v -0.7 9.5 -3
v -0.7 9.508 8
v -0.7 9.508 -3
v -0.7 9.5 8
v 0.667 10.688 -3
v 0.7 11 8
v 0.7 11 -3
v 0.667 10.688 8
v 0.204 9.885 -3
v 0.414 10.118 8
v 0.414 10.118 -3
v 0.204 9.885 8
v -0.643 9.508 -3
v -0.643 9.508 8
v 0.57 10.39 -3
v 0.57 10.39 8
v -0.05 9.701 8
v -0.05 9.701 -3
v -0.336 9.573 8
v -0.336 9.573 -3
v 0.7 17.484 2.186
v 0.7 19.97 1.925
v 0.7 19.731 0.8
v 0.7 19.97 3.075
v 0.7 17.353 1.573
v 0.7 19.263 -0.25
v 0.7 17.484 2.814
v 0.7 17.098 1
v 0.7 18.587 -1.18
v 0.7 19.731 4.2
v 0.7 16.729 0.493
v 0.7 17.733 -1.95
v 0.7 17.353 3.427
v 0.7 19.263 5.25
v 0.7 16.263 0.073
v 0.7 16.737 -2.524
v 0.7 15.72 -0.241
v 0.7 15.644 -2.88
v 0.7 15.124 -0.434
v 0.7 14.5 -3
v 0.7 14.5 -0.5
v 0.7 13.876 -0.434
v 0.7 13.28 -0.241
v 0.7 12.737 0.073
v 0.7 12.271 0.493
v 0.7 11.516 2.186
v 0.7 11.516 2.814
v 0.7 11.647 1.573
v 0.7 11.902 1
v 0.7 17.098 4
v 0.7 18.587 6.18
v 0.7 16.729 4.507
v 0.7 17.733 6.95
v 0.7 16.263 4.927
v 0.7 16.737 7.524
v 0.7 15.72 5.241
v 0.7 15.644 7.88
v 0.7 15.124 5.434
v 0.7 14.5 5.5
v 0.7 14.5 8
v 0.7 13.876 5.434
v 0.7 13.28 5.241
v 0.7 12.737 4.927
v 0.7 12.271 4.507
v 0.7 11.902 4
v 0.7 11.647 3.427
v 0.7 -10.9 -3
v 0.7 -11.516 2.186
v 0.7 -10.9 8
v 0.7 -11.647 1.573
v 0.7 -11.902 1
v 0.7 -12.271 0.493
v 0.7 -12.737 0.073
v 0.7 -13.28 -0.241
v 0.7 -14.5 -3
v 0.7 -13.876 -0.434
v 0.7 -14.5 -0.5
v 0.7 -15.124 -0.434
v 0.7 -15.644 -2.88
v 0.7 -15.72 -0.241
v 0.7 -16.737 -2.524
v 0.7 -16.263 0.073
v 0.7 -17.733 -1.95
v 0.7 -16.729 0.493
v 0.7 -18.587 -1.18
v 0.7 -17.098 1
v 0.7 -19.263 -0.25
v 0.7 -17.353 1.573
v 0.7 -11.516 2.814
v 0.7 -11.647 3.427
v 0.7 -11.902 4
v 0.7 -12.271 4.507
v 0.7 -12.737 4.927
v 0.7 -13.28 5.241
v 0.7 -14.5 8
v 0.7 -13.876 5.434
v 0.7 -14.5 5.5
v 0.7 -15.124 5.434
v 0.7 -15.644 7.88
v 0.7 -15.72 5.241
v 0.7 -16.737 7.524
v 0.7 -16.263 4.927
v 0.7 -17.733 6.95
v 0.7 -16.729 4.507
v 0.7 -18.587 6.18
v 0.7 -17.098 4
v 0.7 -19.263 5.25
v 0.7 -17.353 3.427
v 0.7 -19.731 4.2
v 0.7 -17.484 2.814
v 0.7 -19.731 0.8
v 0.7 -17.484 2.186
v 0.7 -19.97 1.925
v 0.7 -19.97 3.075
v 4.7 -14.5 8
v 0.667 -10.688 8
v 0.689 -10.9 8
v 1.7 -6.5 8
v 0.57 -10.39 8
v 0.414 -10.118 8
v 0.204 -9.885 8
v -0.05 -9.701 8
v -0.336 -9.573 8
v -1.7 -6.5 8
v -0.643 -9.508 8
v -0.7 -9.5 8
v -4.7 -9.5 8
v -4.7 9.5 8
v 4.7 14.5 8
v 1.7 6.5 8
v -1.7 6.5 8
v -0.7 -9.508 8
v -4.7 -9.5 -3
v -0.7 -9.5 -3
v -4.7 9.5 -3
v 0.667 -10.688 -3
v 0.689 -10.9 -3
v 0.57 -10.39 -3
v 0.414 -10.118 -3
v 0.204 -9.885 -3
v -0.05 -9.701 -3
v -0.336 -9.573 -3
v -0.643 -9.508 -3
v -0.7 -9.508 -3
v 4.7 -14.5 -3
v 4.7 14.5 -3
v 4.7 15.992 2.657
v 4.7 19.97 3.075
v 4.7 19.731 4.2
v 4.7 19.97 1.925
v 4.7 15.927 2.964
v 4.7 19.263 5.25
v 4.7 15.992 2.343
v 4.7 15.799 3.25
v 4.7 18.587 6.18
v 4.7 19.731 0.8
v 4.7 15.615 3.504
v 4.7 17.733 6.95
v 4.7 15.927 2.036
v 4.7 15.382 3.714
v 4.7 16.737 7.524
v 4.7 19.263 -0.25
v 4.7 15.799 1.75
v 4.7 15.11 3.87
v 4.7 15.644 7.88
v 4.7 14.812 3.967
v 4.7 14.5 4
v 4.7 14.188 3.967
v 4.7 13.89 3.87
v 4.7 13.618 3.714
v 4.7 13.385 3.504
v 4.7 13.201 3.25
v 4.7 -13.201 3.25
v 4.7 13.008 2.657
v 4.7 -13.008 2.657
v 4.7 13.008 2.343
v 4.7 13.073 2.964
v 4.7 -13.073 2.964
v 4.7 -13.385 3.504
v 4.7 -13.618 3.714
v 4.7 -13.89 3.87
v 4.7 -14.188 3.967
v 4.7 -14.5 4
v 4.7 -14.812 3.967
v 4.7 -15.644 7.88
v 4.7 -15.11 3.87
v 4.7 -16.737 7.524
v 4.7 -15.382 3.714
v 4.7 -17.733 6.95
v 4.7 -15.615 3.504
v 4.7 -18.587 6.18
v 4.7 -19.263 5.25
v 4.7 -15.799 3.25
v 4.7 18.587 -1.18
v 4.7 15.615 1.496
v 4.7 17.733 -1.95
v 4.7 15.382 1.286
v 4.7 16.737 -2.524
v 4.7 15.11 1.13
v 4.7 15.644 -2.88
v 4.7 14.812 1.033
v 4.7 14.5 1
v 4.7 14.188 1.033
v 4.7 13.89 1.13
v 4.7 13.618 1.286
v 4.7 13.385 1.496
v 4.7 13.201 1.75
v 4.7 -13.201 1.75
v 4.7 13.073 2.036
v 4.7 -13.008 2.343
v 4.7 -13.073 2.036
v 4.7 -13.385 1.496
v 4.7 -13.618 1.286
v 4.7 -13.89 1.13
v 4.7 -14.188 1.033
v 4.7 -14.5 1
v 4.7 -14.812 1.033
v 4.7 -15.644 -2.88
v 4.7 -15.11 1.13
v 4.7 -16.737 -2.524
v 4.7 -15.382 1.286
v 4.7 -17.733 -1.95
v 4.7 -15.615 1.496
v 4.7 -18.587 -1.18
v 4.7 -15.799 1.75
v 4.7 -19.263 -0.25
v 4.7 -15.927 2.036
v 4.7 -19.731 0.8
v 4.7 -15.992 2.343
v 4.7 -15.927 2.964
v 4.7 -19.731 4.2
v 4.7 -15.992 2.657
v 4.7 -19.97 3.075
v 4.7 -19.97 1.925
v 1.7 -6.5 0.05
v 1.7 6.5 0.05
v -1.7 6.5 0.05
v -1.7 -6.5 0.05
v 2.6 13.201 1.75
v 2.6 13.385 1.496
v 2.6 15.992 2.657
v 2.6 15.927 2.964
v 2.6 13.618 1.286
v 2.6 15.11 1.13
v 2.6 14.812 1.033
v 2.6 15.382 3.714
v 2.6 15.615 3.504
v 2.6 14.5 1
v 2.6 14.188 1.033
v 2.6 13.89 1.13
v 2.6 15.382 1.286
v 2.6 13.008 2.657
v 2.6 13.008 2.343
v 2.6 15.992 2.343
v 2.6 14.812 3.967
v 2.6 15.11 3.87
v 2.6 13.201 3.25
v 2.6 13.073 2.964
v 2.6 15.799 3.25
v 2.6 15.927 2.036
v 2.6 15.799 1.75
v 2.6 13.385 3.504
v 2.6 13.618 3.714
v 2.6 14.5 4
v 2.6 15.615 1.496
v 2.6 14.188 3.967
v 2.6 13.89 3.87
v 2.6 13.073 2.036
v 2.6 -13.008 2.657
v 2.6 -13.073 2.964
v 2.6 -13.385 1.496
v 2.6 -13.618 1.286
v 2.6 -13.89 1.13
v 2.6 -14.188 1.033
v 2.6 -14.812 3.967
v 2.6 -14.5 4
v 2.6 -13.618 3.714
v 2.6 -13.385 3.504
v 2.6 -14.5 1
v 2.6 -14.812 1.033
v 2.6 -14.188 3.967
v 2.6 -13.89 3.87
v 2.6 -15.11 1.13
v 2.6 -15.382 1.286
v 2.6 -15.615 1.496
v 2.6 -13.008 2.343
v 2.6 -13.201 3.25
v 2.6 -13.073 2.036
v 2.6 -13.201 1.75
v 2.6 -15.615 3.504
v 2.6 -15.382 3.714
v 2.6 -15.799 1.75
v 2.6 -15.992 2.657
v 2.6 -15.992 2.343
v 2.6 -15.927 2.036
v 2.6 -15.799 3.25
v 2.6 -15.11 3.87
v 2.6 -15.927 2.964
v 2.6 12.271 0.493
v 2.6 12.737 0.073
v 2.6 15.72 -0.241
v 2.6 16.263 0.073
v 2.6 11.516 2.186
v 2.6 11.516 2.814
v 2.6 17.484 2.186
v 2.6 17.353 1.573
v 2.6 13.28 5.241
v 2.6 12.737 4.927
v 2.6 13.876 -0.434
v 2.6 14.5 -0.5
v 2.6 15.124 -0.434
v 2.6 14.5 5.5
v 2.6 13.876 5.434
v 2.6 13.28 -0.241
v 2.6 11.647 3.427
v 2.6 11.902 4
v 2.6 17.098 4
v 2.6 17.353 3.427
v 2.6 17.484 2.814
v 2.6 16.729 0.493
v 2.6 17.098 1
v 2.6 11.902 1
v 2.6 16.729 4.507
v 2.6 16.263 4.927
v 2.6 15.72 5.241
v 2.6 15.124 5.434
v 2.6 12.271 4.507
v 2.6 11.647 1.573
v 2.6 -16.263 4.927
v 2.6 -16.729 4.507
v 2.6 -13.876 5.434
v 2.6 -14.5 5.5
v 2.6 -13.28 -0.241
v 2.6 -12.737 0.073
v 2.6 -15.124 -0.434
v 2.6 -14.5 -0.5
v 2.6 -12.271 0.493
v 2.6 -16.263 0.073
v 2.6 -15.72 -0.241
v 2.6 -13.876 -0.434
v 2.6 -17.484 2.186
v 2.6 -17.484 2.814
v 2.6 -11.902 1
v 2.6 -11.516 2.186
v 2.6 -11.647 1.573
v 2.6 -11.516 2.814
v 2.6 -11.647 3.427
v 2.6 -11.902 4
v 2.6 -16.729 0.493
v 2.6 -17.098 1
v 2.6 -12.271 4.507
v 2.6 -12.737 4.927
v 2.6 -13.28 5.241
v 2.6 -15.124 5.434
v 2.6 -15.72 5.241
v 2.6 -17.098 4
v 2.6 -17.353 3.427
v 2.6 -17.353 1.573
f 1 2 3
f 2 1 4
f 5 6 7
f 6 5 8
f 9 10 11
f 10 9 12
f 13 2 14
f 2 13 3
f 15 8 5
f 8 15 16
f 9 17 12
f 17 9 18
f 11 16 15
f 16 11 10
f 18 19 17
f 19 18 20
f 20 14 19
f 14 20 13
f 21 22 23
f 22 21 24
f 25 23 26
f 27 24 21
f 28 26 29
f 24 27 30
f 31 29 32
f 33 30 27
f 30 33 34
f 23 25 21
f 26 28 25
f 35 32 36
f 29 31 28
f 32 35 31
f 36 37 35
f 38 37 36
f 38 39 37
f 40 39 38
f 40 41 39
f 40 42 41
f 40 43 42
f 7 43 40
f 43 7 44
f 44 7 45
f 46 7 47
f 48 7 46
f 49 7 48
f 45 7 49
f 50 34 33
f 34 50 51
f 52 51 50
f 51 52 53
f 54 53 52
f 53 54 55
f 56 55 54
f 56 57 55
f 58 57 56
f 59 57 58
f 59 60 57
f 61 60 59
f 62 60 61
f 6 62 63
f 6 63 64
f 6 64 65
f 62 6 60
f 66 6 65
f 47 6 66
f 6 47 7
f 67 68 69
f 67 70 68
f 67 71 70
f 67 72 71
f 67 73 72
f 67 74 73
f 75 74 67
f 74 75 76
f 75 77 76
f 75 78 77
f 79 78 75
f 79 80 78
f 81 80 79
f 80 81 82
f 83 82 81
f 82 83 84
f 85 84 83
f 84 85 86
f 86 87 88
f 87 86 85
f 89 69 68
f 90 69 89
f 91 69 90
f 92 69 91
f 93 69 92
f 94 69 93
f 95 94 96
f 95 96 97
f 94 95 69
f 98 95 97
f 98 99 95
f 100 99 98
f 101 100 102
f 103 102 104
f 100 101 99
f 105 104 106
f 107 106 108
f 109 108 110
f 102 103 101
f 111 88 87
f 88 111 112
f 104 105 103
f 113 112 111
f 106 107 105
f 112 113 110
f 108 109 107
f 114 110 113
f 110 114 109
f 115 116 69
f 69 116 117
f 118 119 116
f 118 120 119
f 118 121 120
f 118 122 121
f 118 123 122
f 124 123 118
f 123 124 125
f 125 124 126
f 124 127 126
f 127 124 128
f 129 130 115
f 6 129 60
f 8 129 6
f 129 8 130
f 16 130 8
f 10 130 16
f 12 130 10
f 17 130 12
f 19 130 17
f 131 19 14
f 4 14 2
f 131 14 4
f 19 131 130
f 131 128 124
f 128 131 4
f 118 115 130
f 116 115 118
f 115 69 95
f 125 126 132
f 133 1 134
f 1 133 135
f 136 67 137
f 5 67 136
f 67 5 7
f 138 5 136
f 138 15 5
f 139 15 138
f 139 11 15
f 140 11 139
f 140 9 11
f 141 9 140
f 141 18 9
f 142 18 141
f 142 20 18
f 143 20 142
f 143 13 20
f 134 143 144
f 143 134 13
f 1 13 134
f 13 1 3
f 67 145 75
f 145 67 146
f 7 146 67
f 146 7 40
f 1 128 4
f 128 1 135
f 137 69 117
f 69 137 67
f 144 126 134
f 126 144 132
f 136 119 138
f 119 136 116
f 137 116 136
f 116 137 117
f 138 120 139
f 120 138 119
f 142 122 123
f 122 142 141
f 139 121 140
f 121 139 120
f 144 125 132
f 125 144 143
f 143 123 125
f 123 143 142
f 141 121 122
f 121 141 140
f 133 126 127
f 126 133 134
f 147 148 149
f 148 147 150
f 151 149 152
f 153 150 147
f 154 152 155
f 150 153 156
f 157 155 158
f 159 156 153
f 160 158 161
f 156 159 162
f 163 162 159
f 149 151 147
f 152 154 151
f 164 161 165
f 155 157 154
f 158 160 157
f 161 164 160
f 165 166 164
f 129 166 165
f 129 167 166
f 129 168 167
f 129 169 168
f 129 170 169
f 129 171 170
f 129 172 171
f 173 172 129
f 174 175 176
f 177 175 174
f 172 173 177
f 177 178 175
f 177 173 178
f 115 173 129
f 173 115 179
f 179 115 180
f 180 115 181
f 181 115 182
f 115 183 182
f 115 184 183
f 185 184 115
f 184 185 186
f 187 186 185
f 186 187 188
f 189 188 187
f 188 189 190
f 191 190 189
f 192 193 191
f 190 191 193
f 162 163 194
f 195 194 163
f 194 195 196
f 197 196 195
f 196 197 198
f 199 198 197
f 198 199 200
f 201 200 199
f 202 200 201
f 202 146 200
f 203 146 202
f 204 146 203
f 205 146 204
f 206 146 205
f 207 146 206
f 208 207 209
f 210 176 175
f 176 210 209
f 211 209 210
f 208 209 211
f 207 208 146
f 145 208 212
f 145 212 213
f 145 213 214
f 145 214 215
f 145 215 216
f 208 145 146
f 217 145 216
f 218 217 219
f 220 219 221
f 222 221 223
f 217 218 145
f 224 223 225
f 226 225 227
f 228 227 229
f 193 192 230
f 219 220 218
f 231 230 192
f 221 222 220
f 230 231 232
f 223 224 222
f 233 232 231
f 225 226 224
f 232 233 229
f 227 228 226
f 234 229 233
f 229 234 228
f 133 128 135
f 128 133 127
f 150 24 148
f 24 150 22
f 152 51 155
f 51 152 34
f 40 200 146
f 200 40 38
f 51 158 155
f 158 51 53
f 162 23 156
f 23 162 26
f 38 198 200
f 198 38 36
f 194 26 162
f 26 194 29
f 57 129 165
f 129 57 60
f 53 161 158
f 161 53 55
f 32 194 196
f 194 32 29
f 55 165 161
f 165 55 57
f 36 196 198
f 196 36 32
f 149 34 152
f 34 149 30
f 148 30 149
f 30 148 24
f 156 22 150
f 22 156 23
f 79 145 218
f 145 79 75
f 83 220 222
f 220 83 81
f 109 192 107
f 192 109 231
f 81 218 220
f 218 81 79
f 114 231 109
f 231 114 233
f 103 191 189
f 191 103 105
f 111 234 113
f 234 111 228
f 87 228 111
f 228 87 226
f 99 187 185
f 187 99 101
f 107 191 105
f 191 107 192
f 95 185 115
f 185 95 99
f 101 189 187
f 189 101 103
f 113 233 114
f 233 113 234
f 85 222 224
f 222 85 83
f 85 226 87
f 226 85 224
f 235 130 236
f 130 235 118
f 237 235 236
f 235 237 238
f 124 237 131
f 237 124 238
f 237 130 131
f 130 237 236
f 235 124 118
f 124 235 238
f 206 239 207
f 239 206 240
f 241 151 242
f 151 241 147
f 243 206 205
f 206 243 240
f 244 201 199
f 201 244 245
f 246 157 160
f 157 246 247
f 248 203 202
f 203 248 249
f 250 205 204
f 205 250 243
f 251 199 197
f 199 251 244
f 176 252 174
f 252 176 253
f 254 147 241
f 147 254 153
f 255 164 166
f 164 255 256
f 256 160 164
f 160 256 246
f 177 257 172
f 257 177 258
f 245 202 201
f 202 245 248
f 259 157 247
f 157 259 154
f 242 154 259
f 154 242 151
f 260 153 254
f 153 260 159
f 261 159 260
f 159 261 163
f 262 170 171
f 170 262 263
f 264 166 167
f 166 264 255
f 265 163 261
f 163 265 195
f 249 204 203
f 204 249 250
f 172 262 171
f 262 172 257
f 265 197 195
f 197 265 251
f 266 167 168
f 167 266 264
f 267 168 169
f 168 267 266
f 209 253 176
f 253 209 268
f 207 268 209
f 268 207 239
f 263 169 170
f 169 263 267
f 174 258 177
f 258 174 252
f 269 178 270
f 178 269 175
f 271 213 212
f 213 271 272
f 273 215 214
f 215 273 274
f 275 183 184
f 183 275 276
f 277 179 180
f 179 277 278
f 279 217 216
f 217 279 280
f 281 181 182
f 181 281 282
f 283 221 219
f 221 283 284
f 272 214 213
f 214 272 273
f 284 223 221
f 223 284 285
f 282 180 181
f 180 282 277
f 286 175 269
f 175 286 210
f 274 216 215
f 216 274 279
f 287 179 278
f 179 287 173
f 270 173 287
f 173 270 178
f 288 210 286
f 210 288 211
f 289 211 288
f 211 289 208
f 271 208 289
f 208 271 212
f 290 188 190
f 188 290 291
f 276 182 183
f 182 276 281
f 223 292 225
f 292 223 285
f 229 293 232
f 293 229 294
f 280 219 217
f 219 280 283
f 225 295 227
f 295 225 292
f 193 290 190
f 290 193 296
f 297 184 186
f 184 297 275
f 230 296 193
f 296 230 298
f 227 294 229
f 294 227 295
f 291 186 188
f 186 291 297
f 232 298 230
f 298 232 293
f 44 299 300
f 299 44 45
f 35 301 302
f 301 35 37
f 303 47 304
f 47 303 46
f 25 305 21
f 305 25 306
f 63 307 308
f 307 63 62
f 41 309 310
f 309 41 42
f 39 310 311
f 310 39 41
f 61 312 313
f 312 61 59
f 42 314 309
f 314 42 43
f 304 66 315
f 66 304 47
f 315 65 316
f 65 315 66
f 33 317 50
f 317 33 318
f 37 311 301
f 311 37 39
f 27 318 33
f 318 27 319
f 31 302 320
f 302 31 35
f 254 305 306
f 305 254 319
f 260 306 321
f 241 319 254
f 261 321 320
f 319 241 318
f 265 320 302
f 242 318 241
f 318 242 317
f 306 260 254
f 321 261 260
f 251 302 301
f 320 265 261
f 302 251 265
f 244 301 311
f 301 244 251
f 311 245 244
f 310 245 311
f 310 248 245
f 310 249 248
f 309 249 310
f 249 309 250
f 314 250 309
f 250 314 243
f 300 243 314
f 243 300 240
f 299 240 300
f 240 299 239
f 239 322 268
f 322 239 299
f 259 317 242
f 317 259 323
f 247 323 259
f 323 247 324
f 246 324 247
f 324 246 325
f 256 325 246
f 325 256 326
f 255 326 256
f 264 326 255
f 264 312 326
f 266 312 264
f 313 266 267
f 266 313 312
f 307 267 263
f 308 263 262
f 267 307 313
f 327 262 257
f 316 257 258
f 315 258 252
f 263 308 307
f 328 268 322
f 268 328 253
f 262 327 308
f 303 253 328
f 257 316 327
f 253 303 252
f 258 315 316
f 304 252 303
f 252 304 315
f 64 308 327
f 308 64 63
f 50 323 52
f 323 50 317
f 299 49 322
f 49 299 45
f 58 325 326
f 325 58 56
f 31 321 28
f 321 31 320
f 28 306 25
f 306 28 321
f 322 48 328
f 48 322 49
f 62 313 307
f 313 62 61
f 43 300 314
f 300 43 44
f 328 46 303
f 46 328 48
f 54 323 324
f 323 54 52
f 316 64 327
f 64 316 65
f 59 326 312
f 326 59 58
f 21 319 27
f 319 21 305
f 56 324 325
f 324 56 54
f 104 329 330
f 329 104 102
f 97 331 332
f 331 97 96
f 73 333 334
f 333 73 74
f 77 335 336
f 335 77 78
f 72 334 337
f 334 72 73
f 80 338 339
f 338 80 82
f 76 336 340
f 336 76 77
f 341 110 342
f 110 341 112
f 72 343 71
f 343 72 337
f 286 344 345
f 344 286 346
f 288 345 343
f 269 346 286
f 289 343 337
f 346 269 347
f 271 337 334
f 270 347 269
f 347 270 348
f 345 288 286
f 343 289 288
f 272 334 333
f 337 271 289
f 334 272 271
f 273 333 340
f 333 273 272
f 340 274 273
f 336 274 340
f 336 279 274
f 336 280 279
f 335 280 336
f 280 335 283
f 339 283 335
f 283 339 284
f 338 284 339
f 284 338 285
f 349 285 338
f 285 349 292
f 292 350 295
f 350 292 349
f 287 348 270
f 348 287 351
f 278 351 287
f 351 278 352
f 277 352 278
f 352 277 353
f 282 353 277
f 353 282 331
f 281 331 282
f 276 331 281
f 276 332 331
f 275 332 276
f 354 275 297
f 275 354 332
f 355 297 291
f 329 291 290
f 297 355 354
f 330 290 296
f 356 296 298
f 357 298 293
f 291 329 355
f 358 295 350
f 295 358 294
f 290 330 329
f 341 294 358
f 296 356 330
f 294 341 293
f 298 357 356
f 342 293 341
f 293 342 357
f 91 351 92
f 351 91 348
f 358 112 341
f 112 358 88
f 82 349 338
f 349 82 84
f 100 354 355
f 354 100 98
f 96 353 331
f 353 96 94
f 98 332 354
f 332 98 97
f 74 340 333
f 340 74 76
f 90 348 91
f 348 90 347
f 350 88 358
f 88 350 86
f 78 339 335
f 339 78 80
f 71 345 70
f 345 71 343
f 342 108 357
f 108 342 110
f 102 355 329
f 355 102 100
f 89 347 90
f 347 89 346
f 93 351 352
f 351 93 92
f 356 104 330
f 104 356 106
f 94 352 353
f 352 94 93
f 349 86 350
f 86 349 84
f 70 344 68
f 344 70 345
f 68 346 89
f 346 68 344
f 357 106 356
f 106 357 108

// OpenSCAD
// -----------------------------------------------------------
// Customizable Socket Organizers: Rectangular End Cap
// -----------------------------------------------------------
//
// Zemba Craftworks
// youtube.com/zembacraftworks
// thingiverse.com/zembacraftworks/about

// This is a configurable, 3D printable insert designed to
// slide onto a metal or wooden bar to create socket set
// organizers. Dimensions can be adjusted for sockets of
// all sizes and to slide onto bars/holders of any size.

// Date Created:  2019-01-03
// Last Modified: 2019-01-03

// Critical Dimensions
// -------------------
// Adjust these dimensions and verify them with a test print
// before printing holders for all of your sockets! You want a
// snug fit but not so tight that anything gets stuck. These
// values will vary depending on your sockets, the rail you're
// using, and the calibration of your printer.


rx = 3.4;           // Rail Cross-Section Thickness (mm)
ry = 13;            // Rail Cross-Section Width (mm)

ct = 3;             // Wall Thickness of End Cap (mm)
ch = 8;             // Height of End Cap (mm)

fn1 = 30;           // Number of Facets for Curvature

hd1 = 3;            // Mounting Hole Diameter (Through-hole)
hd2 = 6;            // Mounting Hole Diameter (Counterbore)

hz = 0;             // Mounting Hole Offset Distance
hx = 2;             // Mounting Hole Counterbore Depth

f1 = 4;             // Flange Thickness
f2 = 5;             // Flange Width (Extra)
f3 = 3;             // Flange Fillet

// Tolerance Value
// ---------------
// When shapes are subtracted through difference() in
// OpenSCAD, there is ambiguity if any faces of the two shapes
// occupy the same space. Adding a small value 't' to make
// the subtracted shape slightly larger prevents this.

t = 0.1;

// Create End Cap
 
    // Rail Clamp
    difference(){
        union(){
            // Main Rail Clamp
            translate([-(rx+2*ct)/2, -(ry+2*ct)/2, 0]){
                cube([rx + 2*ct, ry + 2*ct, ch]);    }    

            // Mounting Flange
            translate([rx/2+ct-f1,-(ry+2*ct+2*f2)/2,-ct])
                cube([f1,ry+2*ct+2*f2,ch+ct]);
            translate([rx/2+ct-f1,ry/2+ct+f2,(ct+ch)/2-ct])
                rotate([0,90,0])
                cylinder(r=(ct+ch)/2,h=f1,$fn=fn1);
            translate([rx/2+ct-f1,-ry/2-ct-f2,(ct+ch)/2-ct])
                rotate([0,90,0])
                cylinder(r=(ct+ch)/2,h=f1,$fn=fn1);

            // (Optional) Square Edges on Flange
            // Top (+z)
            //translate([rx/2+ct-f1,-ry/2-ct-f2-(ch+ct)/2,-ct+(ch+ct)/2])
            //    cube([f1,2*ry/2+2*ct+2*f2+ch+ct,(ch+ct)/2]);
            // Bottom (-z)
            //translate([rx/2+ct-f1,-ry/2-ct-f2-(ch+ct)/2,-ct])
            //    cube([f1,2*ry/2+2*ct+2*f2+ch+ct,(ch+ct)/2]);

            // Flange Fillet 1
            difference(){
            translate([rx/2+ct-f1-f3,ry/2+ct,-ct])
                cube([f3,f3,ct+ch]);
            union(){
            translate([rx/2+ct-f1-f3-f3/2,ry/2+ct+f3/2,-ct-t/2])
                cube([1.5*f3+t,f3+t,ct+ch+t]);
            translate([rx/2+ct-f1-f3-f3/2,ry/2+ct-t/2,-ct-t/2])
                cube([f3+t,1.5*f3+t,ct+ch+t]);
            translate([rx/2+ct-f1-f3/2,ry/2+ct+f3/2,-ct-t/2])
                cylinder(r=f3/2,h=ct+ch+t,$fn=fn1);}}     
    
            // Flange Fillet 2
            difference(){
            translate([rx/2+ct-f1-f3,-ry/2-ct-f3,-ct])
                cube([f3,f3,ct+ch]);
            union(){
            translate([rx/2+ct-f1-f3-f3/2,-ry/2-ct-f3-f3/2,-ct-t/2])
                cube([1.5*f3+t,f3+t,ct+ch+t]);
            translate([rx/2+ct-f1-f3-f3/2,-ry/2-ct-f3-f3/2,-ct-t/2])
                cube([f3+t,1.5*f3+t,ct+ch+t]);
            translate([rx/2+ct-f1-f3/2,-ry/2-ct-f3/2,-ct-t/2])
                cylinder(r=f3/2,h=ct+ch+t,$fn=fn1);}}      

            // Rail Cap
            translate([-(rx+2*ct)/2, -(ry+2*ct)/2, -ct]){
            cube([rx + 2*ct, ry + 2*ct, ct]);}
            }

        union(){
            // Rail
            translate([-rx/2, -ry/2, t/2]){
                cube([rx, ry, ch+t]);    }

            // Mounting Holes
            translate([rx/2+ct-f1-t/2,ry/2+ct+f2+hz,ch-(ch+ct)/2])
            rotate([0,90,0])
            cylinder(r=hd1/2,h=f1+t,$fn=fn1);

            translate([rx/2+ct-f1-t/2,-(ry/2+ct+f2+hz),ch-(ch+ct)/2])
            rotate([0,90,0])
            cylinder(r=hd1/2,h=f1+t,$fn=fn1);

            // Mounting Hole Counterbore
            translate([rx/2+ct-f1-t,ry/2+ct+f2+hz,ch-(ch+ct)/2])
            rotate([0,90,0])
            cylinder(r=hd2/2,h=hx,$fn=fn1);

            translate([rx/2+ct-f1-t,-(ry/2+ct+f2+hz),ch-(ch+ct)/2])
            rotate([0,90,0])
            cylinder(r=hd2/2,h=hx,$fn=fn1);
            }
    }
